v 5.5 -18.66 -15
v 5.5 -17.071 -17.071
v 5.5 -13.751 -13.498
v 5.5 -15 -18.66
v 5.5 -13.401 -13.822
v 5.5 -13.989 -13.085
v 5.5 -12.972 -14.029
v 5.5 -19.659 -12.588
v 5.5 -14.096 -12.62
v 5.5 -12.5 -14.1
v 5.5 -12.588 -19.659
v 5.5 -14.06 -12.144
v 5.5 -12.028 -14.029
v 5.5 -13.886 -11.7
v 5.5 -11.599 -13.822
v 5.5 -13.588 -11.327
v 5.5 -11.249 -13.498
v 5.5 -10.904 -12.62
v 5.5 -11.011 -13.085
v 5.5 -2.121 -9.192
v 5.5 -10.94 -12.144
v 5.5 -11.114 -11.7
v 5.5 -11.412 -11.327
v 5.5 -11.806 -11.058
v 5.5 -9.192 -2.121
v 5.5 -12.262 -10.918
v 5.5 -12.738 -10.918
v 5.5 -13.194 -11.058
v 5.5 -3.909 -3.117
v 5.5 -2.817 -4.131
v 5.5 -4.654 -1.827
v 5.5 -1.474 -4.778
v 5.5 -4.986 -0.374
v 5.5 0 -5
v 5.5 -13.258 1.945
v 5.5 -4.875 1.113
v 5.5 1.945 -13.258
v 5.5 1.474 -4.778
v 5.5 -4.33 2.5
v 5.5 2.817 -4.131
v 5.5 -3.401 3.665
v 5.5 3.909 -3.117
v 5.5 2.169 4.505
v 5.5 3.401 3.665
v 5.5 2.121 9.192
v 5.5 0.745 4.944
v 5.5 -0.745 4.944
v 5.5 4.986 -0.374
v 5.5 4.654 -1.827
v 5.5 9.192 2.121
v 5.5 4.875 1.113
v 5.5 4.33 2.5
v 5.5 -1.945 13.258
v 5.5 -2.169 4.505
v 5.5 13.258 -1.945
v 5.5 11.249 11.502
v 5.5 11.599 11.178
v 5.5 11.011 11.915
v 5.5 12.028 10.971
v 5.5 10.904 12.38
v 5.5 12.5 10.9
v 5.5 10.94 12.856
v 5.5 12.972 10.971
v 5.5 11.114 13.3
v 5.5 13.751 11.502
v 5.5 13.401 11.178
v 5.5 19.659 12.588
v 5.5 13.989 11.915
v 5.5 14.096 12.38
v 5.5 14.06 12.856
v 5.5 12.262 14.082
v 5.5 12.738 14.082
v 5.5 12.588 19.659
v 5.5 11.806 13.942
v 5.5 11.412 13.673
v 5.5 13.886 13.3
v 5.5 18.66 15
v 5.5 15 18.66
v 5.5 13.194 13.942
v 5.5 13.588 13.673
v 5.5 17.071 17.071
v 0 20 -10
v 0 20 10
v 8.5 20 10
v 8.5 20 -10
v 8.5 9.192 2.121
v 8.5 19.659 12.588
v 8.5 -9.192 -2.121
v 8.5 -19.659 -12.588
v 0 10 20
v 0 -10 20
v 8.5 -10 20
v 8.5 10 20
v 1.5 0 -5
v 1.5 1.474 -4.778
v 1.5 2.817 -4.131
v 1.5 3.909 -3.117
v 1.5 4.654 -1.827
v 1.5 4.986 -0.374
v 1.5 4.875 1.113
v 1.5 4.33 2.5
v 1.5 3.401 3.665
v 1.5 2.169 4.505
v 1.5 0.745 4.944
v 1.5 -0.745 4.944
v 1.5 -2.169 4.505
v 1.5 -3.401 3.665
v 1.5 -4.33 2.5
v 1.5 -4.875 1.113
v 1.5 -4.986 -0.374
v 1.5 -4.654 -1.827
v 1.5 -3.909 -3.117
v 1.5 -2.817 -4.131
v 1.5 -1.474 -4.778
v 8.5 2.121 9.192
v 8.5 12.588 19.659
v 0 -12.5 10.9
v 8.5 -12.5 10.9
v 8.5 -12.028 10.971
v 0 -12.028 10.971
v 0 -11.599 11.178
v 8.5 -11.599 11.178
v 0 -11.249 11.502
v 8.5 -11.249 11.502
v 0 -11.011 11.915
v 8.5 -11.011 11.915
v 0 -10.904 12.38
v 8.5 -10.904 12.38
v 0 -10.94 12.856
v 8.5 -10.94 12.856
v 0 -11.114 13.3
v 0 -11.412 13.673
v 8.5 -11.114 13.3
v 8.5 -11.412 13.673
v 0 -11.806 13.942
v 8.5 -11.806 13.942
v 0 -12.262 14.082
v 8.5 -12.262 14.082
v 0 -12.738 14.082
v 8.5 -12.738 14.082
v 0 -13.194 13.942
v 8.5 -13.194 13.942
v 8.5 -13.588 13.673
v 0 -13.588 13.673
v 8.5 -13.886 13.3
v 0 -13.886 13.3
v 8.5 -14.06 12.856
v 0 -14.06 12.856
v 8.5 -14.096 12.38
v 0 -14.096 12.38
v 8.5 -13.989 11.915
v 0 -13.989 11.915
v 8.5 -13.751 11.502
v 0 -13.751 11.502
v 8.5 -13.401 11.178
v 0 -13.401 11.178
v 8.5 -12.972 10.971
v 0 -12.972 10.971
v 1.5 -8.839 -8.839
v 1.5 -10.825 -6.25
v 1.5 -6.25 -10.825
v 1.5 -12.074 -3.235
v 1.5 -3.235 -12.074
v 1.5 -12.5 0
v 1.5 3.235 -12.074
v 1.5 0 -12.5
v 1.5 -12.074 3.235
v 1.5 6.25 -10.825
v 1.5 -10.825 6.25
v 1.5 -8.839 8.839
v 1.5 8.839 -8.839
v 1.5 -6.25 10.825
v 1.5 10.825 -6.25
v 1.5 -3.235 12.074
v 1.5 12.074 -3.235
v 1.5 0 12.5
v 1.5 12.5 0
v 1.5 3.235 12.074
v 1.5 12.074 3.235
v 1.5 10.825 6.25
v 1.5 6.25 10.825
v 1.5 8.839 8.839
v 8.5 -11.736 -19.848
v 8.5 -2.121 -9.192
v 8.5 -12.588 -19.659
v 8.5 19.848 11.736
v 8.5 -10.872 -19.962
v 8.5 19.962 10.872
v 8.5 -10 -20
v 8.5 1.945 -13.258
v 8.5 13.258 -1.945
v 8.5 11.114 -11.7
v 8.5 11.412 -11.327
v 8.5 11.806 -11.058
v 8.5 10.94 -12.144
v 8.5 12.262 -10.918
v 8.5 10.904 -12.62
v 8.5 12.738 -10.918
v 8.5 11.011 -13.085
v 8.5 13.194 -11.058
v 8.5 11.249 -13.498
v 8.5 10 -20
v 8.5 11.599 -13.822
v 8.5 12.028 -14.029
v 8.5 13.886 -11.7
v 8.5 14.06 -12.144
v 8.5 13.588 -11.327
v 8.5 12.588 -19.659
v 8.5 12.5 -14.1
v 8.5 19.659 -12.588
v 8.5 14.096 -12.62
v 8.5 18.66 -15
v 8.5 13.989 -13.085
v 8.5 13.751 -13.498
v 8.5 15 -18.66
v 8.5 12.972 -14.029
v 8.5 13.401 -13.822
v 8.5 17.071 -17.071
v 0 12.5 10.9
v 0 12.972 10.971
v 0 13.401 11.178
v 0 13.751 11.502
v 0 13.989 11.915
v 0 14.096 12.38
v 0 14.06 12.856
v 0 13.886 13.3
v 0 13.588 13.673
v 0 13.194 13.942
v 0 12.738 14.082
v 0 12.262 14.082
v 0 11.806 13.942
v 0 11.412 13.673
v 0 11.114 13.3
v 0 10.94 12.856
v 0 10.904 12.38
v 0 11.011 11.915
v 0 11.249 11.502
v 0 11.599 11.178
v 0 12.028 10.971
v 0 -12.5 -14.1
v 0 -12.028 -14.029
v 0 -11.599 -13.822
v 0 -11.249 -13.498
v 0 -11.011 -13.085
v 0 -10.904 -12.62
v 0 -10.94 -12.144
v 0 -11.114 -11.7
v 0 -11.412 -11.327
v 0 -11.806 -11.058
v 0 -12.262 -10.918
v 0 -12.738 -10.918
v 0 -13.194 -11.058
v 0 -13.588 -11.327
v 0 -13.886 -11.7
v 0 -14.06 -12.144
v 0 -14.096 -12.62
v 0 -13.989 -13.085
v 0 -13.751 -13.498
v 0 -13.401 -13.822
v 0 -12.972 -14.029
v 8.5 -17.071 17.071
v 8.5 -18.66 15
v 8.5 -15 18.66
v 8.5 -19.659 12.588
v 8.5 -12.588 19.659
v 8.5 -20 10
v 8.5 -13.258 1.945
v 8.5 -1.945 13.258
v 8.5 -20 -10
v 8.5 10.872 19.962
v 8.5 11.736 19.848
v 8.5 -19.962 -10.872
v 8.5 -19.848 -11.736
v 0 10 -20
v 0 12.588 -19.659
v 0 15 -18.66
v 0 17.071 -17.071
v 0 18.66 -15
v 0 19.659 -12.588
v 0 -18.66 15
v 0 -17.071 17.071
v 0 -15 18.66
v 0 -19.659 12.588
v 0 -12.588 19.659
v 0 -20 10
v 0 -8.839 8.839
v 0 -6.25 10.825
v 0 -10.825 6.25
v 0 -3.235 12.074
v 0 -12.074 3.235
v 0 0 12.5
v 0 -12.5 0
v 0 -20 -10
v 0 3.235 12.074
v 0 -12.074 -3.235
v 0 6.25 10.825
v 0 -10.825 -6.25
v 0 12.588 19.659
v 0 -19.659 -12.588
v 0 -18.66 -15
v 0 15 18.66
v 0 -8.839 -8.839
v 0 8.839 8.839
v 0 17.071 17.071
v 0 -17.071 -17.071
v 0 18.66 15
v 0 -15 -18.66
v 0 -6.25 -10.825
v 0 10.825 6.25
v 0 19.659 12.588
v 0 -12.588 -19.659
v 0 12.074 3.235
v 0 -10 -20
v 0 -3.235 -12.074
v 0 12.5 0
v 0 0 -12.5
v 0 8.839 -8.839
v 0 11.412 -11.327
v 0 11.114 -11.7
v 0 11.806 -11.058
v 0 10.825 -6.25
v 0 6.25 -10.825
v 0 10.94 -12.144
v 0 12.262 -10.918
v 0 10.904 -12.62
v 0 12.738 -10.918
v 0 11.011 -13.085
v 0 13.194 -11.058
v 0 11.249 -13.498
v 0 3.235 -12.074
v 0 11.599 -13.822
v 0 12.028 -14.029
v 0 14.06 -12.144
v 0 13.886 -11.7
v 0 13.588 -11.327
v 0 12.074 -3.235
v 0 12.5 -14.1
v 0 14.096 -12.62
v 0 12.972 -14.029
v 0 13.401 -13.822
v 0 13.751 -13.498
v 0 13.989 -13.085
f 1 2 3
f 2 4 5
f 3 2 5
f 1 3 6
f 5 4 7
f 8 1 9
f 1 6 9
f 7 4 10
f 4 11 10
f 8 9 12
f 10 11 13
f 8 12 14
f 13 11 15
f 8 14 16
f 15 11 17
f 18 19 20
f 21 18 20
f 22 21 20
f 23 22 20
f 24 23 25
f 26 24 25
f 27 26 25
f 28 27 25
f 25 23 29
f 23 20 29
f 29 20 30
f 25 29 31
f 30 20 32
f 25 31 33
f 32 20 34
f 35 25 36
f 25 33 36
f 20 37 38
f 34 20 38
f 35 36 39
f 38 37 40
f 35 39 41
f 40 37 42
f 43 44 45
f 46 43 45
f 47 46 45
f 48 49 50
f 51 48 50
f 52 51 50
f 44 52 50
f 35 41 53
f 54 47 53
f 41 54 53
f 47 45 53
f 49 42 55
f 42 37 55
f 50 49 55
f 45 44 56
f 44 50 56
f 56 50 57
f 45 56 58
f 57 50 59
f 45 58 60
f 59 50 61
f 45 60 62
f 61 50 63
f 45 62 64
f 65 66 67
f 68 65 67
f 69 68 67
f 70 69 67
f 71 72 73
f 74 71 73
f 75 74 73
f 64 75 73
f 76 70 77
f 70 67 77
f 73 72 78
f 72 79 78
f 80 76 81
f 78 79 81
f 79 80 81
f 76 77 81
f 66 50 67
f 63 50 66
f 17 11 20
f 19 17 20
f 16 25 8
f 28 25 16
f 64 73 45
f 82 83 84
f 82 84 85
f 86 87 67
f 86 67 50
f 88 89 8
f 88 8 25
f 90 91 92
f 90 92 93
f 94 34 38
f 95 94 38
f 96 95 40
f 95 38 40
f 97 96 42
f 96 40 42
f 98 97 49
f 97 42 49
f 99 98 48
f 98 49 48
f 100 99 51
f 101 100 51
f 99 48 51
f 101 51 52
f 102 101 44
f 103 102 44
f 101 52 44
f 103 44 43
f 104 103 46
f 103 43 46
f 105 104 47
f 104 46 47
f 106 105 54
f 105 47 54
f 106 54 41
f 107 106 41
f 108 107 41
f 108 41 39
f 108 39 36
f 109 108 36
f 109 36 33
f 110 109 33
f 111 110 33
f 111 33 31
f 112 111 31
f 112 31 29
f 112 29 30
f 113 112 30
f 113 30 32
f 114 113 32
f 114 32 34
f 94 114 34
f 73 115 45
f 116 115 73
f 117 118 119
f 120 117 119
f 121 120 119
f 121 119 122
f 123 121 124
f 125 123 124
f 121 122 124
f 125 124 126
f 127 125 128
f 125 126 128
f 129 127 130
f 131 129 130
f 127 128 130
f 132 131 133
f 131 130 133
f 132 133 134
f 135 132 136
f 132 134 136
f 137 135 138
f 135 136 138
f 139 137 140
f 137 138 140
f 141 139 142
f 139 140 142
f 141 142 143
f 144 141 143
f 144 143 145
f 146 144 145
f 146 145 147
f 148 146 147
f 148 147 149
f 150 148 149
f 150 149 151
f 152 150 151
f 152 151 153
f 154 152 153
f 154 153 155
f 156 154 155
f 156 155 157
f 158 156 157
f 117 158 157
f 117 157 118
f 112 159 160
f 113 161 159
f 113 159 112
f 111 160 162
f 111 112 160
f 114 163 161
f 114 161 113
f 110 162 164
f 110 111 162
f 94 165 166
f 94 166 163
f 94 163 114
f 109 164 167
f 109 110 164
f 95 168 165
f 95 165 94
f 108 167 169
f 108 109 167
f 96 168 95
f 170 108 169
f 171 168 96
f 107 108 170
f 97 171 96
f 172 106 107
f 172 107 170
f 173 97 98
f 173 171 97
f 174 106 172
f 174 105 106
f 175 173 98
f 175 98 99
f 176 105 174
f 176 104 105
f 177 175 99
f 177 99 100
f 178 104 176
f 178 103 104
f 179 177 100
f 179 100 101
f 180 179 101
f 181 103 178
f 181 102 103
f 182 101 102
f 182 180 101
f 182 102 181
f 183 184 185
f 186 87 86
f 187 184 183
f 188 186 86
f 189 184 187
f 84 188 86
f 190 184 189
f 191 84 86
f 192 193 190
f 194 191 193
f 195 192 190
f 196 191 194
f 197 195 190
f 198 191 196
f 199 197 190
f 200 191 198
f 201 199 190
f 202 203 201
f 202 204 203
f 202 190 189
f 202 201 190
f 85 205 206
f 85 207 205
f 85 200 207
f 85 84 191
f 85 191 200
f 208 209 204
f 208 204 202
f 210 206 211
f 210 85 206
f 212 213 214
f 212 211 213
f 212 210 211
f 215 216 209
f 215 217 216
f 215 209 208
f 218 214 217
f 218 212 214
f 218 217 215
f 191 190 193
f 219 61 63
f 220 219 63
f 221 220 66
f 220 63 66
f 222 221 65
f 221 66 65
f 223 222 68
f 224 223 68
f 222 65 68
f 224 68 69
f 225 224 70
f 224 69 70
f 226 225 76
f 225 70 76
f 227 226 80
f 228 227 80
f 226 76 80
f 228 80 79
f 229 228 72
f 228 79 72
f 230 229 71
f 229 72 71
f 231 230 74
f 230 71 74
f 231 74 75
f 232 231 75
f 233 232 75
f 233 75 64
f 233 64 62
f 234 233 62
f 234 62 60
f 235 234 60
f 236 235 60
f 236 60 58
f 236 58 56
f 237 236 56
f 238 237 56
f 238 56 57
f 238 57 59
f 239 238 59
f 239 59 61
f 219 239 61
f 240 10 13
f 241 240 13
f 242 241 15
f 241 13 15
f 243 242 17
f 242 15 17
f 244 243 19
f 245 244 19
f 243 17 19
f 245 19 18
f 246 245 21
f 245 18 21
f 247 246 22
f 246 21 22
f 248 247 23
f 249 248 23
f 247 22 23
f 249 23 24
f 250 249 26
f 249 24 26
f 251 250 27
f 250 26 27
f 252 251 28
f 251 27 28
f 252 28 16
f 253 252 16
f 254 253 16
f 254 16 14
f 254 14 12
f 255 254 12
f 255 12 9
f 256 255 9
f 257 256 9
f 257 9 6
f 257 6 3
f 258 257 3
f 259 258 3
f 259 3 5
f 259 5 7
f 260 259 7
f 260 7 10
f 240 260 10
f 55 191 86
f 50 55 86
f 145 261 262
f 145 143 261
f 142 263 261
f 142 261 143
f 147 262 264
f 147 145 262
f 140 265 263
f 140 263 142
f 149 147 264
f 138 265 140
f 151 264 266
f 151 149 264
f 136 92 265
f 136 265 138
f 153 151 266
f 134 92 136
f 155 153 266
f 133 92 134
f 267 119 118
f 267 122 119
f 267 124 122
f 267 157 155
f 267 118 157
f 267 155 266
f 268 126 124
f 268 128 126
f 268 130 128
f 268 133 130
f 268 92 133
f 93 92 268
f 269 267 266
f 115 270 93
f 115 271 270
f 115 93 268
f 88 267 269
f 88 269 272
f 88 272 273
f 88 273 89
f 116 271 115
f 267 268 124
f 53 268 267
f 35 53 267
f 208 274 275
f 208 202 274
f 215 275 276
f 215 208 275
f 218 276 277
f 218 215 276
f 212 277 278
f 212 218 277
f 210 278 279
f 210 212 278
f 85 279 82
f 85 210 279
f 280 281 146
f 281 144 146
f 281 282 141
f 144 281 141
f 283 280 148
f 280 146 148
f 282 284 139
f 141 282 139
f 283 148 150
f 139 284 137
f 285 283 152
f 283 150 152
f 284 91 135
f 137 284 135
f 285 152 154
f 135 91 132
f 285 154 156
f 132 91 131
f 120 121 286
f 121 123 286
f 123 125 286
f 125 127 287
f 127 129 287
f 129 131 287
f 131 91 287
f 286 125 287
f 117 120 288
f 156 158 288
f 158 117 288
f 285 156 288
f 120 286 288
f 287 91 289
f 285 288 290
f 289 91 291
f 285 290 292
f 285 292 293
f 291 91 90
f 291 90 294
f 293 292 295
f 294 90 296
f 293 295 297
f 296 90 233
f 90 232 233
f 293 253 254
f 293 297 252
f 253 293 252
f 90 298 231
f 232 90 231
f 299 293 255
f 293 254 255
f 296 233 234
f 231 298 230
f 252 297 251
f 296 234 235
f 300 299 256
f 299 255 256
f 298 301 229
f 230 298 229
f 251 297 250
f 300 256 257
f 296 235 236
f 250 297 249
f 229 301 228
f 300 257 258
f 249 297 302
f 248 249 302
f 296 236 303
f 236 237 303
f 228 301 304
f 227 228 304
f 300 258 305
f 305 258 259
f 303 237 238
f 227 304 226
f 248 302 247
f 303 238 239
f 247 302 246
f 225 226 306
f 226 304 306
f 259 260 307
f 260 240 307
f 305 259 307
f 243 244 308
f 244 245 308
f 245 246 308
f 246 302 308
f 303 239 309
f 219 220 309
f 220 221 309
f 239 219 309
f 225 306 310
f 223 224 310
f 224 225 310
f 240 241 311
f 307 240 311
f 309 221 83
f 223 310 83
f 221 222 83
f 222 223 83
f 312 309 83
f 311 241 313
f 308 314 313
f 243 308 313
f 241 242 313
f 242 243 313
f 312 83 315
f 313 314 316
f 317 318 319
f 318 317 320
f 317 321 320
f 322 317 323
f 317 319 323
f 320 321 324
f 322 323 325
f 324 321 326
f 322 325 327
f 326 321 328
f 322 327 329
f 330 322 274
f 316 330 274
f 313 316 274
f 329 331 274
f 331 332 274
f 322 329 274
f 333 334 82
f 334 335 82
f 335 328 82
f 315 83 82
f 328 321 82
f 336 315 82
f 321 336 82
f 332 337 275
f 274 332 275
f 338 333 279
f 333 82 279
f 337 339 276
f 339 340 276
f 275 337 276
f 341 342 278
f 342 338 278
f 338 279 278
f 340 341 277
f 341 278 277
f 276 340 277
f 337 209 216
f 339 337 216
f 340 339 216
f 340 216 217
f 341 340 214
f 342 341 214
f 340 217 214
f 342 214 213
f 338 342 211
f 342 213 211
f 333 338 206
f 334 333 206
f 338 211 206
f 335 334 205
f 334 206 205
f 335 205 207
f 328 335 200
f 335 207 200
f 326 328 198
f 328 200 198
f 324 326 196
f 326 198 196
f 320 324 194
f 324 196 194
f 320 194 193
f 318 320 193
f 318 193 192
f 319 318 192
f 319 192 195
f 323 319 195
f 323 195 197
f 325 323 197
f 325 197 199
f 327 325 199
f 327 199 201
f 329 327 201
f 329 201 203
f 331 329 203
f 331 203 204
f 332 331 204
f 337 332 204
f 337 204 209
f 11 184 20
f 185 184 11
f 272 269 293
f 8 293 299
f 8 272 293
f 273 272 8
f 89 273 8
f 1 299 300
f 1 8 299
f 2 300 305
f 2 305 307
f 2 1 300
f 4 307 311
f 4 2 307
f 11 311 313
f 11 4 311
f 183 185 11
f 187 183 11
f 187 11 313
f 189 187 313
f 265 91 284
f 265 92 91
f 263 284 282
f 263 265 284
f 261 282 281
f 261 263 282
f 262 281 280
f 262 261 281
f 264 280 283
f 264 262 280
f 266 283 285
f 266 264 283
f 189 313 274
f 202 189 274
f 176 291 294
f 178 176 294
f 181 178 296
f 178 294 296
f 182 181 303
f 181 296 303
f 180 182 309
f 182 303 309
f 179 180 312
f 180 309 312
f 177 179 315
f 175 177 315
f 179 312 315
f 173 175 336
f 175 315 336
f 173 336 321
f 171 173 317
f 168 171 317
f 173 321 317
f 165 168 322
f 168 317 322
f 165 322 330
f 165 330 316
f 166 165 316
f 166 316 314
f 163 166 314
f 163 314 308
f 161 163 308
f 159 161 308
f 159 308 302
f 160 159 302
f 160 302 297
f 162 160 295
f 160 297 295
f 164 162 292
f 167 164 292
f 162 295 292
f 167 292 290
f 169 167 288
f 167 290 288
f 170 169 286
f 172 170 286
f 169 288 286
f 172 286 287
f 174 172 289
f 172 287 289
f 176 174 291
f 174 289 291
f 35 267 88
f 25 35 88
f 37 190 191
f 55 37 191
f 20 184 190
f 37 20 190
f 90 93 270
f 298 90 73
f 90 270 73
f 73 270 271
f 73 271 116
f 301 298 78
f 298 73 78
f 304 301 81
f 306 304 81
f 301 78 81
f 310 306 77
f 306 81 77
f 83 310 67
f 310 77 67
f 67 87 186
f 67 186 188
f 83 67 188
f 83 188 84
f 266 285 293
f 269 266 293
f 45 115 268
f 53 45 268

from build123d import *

# Parameters (mm, degrees)
SKETCH1_W           = 40
SKETCH1_H           = 40
BOSS_EXTRUDE1_DEPTH = 8.5
FILLET1_R           = 10
CUT_EXTRUDE1_DEPTH  = 3
SKETCH4_R           = 5
CUT_EXTRUDE2_DEPTH  = 29.814059068
SKETCH5_R           = 1.6
CUT_EXTRUDE3_DEPTH  = 30.533878851
CUT_EXTRUDE4_DEPTH  = 3
SKETCH8_R           = 12.5
CUT_EXTRUDE5_DEPTH  = 1.5


with BuildPart() as part:
    # Sketch1 → Boss-Extrude1 (new body)
    with BuildSketch(Plane(origin=(0, 0, 0), x_dir=(0, 0, -1), z_dir=(1, 0, 0))):
        Rectangle(SKETCH1_W, SKETCH1_H)
    extrude(amount=BOSS_EXTRUDE1_DEPTH)

    # Fillet1
    fillet1_edges = [part.edges().sort_by_distance(p)[0] for p in [
        (4.25, -20, -20),
        (4.25, -20, 20),
        (4.25, 20, 20),
        (4.25, 20, -20),
    ]]
    fillet(fillet1_edges, radius=FILLET1_R)

    # Sketch2 → Cut-Extrude1 (cut)
    with BuildSketch(Plane(origin=(8.5, 0, 0), x_dir=(0, 0, -1), z_dir=(1, 0, 0))):
        Polygon((-1.944543648, -13.258252147), (13.258252147, 1.944543648), (1.944543648, 13.258252147), (-13.258252147, -1.944543648), align=None)
    extrude(amount=-CUT_EXTRUDE1_DEPTH, mode=Mode.SUBTRACT)

    # Sketch4 → Cut-Extrude2 (cut, through all)
    with BuildSketch(Plane(origin=(5.5, 0, 0), x_dir=(0, 0, -1), z_dir=(1, 0, 0))):
        Circle(SKETCH4_R)
    extrude(amount=-CUT_EXTRUDE2_DEPTH, mode=Mode.SUBTRACT)

    # Sketch5 → Cut-Extrude3 (cut, through all)
    with BuildSketch(Plane(origin=(8.5, 0, 0), x_dir=(0, 0, -1), z_dir=(1, 0, 0))):
        with Locations((-12.5, 12.5)):
            Circle(SKETCH5_R)
        with Locations((-12.5, -12.5)):
            Circle(SKETCH5_R)
        with Locations((12.5, -12.5)):
            Circle(SKETCH5_R)
        with Locations((12.5, 12.5)):
            Circle(SKETCH5_R)
    extrude(amount=-CUT_EXTRUDE3_DEPTH, mode=Mode.SUBTRACT)

    # Sketch7 → Cut-Extrude4 (cut)
    with BuildSketch(Plane(origin=(8.5, 0, 0), x_dir=(0, 0, -1), z_dir=(1, 0, 0))):
        Polygon((14.142135624, -21.213203436), (-21.213203436, 14.142135624), (-14.142135624, 21.213203436), (21.213203436, -14.142135624), align=None)
    extrude(amount=-CUT_EXTRUDE4_DEPTH, mode=Mode.SUBTRACT)

    # Sketch8 → Cut-Extrude5 (cut)
    with BuildSketch(Plane.ZY):
        Circle(SKETCH8_R)
    extrude(amount=-CUT_EXTRUDE5_DEPTH, mode=Mode.SUBTRACT)


solid = part.part
